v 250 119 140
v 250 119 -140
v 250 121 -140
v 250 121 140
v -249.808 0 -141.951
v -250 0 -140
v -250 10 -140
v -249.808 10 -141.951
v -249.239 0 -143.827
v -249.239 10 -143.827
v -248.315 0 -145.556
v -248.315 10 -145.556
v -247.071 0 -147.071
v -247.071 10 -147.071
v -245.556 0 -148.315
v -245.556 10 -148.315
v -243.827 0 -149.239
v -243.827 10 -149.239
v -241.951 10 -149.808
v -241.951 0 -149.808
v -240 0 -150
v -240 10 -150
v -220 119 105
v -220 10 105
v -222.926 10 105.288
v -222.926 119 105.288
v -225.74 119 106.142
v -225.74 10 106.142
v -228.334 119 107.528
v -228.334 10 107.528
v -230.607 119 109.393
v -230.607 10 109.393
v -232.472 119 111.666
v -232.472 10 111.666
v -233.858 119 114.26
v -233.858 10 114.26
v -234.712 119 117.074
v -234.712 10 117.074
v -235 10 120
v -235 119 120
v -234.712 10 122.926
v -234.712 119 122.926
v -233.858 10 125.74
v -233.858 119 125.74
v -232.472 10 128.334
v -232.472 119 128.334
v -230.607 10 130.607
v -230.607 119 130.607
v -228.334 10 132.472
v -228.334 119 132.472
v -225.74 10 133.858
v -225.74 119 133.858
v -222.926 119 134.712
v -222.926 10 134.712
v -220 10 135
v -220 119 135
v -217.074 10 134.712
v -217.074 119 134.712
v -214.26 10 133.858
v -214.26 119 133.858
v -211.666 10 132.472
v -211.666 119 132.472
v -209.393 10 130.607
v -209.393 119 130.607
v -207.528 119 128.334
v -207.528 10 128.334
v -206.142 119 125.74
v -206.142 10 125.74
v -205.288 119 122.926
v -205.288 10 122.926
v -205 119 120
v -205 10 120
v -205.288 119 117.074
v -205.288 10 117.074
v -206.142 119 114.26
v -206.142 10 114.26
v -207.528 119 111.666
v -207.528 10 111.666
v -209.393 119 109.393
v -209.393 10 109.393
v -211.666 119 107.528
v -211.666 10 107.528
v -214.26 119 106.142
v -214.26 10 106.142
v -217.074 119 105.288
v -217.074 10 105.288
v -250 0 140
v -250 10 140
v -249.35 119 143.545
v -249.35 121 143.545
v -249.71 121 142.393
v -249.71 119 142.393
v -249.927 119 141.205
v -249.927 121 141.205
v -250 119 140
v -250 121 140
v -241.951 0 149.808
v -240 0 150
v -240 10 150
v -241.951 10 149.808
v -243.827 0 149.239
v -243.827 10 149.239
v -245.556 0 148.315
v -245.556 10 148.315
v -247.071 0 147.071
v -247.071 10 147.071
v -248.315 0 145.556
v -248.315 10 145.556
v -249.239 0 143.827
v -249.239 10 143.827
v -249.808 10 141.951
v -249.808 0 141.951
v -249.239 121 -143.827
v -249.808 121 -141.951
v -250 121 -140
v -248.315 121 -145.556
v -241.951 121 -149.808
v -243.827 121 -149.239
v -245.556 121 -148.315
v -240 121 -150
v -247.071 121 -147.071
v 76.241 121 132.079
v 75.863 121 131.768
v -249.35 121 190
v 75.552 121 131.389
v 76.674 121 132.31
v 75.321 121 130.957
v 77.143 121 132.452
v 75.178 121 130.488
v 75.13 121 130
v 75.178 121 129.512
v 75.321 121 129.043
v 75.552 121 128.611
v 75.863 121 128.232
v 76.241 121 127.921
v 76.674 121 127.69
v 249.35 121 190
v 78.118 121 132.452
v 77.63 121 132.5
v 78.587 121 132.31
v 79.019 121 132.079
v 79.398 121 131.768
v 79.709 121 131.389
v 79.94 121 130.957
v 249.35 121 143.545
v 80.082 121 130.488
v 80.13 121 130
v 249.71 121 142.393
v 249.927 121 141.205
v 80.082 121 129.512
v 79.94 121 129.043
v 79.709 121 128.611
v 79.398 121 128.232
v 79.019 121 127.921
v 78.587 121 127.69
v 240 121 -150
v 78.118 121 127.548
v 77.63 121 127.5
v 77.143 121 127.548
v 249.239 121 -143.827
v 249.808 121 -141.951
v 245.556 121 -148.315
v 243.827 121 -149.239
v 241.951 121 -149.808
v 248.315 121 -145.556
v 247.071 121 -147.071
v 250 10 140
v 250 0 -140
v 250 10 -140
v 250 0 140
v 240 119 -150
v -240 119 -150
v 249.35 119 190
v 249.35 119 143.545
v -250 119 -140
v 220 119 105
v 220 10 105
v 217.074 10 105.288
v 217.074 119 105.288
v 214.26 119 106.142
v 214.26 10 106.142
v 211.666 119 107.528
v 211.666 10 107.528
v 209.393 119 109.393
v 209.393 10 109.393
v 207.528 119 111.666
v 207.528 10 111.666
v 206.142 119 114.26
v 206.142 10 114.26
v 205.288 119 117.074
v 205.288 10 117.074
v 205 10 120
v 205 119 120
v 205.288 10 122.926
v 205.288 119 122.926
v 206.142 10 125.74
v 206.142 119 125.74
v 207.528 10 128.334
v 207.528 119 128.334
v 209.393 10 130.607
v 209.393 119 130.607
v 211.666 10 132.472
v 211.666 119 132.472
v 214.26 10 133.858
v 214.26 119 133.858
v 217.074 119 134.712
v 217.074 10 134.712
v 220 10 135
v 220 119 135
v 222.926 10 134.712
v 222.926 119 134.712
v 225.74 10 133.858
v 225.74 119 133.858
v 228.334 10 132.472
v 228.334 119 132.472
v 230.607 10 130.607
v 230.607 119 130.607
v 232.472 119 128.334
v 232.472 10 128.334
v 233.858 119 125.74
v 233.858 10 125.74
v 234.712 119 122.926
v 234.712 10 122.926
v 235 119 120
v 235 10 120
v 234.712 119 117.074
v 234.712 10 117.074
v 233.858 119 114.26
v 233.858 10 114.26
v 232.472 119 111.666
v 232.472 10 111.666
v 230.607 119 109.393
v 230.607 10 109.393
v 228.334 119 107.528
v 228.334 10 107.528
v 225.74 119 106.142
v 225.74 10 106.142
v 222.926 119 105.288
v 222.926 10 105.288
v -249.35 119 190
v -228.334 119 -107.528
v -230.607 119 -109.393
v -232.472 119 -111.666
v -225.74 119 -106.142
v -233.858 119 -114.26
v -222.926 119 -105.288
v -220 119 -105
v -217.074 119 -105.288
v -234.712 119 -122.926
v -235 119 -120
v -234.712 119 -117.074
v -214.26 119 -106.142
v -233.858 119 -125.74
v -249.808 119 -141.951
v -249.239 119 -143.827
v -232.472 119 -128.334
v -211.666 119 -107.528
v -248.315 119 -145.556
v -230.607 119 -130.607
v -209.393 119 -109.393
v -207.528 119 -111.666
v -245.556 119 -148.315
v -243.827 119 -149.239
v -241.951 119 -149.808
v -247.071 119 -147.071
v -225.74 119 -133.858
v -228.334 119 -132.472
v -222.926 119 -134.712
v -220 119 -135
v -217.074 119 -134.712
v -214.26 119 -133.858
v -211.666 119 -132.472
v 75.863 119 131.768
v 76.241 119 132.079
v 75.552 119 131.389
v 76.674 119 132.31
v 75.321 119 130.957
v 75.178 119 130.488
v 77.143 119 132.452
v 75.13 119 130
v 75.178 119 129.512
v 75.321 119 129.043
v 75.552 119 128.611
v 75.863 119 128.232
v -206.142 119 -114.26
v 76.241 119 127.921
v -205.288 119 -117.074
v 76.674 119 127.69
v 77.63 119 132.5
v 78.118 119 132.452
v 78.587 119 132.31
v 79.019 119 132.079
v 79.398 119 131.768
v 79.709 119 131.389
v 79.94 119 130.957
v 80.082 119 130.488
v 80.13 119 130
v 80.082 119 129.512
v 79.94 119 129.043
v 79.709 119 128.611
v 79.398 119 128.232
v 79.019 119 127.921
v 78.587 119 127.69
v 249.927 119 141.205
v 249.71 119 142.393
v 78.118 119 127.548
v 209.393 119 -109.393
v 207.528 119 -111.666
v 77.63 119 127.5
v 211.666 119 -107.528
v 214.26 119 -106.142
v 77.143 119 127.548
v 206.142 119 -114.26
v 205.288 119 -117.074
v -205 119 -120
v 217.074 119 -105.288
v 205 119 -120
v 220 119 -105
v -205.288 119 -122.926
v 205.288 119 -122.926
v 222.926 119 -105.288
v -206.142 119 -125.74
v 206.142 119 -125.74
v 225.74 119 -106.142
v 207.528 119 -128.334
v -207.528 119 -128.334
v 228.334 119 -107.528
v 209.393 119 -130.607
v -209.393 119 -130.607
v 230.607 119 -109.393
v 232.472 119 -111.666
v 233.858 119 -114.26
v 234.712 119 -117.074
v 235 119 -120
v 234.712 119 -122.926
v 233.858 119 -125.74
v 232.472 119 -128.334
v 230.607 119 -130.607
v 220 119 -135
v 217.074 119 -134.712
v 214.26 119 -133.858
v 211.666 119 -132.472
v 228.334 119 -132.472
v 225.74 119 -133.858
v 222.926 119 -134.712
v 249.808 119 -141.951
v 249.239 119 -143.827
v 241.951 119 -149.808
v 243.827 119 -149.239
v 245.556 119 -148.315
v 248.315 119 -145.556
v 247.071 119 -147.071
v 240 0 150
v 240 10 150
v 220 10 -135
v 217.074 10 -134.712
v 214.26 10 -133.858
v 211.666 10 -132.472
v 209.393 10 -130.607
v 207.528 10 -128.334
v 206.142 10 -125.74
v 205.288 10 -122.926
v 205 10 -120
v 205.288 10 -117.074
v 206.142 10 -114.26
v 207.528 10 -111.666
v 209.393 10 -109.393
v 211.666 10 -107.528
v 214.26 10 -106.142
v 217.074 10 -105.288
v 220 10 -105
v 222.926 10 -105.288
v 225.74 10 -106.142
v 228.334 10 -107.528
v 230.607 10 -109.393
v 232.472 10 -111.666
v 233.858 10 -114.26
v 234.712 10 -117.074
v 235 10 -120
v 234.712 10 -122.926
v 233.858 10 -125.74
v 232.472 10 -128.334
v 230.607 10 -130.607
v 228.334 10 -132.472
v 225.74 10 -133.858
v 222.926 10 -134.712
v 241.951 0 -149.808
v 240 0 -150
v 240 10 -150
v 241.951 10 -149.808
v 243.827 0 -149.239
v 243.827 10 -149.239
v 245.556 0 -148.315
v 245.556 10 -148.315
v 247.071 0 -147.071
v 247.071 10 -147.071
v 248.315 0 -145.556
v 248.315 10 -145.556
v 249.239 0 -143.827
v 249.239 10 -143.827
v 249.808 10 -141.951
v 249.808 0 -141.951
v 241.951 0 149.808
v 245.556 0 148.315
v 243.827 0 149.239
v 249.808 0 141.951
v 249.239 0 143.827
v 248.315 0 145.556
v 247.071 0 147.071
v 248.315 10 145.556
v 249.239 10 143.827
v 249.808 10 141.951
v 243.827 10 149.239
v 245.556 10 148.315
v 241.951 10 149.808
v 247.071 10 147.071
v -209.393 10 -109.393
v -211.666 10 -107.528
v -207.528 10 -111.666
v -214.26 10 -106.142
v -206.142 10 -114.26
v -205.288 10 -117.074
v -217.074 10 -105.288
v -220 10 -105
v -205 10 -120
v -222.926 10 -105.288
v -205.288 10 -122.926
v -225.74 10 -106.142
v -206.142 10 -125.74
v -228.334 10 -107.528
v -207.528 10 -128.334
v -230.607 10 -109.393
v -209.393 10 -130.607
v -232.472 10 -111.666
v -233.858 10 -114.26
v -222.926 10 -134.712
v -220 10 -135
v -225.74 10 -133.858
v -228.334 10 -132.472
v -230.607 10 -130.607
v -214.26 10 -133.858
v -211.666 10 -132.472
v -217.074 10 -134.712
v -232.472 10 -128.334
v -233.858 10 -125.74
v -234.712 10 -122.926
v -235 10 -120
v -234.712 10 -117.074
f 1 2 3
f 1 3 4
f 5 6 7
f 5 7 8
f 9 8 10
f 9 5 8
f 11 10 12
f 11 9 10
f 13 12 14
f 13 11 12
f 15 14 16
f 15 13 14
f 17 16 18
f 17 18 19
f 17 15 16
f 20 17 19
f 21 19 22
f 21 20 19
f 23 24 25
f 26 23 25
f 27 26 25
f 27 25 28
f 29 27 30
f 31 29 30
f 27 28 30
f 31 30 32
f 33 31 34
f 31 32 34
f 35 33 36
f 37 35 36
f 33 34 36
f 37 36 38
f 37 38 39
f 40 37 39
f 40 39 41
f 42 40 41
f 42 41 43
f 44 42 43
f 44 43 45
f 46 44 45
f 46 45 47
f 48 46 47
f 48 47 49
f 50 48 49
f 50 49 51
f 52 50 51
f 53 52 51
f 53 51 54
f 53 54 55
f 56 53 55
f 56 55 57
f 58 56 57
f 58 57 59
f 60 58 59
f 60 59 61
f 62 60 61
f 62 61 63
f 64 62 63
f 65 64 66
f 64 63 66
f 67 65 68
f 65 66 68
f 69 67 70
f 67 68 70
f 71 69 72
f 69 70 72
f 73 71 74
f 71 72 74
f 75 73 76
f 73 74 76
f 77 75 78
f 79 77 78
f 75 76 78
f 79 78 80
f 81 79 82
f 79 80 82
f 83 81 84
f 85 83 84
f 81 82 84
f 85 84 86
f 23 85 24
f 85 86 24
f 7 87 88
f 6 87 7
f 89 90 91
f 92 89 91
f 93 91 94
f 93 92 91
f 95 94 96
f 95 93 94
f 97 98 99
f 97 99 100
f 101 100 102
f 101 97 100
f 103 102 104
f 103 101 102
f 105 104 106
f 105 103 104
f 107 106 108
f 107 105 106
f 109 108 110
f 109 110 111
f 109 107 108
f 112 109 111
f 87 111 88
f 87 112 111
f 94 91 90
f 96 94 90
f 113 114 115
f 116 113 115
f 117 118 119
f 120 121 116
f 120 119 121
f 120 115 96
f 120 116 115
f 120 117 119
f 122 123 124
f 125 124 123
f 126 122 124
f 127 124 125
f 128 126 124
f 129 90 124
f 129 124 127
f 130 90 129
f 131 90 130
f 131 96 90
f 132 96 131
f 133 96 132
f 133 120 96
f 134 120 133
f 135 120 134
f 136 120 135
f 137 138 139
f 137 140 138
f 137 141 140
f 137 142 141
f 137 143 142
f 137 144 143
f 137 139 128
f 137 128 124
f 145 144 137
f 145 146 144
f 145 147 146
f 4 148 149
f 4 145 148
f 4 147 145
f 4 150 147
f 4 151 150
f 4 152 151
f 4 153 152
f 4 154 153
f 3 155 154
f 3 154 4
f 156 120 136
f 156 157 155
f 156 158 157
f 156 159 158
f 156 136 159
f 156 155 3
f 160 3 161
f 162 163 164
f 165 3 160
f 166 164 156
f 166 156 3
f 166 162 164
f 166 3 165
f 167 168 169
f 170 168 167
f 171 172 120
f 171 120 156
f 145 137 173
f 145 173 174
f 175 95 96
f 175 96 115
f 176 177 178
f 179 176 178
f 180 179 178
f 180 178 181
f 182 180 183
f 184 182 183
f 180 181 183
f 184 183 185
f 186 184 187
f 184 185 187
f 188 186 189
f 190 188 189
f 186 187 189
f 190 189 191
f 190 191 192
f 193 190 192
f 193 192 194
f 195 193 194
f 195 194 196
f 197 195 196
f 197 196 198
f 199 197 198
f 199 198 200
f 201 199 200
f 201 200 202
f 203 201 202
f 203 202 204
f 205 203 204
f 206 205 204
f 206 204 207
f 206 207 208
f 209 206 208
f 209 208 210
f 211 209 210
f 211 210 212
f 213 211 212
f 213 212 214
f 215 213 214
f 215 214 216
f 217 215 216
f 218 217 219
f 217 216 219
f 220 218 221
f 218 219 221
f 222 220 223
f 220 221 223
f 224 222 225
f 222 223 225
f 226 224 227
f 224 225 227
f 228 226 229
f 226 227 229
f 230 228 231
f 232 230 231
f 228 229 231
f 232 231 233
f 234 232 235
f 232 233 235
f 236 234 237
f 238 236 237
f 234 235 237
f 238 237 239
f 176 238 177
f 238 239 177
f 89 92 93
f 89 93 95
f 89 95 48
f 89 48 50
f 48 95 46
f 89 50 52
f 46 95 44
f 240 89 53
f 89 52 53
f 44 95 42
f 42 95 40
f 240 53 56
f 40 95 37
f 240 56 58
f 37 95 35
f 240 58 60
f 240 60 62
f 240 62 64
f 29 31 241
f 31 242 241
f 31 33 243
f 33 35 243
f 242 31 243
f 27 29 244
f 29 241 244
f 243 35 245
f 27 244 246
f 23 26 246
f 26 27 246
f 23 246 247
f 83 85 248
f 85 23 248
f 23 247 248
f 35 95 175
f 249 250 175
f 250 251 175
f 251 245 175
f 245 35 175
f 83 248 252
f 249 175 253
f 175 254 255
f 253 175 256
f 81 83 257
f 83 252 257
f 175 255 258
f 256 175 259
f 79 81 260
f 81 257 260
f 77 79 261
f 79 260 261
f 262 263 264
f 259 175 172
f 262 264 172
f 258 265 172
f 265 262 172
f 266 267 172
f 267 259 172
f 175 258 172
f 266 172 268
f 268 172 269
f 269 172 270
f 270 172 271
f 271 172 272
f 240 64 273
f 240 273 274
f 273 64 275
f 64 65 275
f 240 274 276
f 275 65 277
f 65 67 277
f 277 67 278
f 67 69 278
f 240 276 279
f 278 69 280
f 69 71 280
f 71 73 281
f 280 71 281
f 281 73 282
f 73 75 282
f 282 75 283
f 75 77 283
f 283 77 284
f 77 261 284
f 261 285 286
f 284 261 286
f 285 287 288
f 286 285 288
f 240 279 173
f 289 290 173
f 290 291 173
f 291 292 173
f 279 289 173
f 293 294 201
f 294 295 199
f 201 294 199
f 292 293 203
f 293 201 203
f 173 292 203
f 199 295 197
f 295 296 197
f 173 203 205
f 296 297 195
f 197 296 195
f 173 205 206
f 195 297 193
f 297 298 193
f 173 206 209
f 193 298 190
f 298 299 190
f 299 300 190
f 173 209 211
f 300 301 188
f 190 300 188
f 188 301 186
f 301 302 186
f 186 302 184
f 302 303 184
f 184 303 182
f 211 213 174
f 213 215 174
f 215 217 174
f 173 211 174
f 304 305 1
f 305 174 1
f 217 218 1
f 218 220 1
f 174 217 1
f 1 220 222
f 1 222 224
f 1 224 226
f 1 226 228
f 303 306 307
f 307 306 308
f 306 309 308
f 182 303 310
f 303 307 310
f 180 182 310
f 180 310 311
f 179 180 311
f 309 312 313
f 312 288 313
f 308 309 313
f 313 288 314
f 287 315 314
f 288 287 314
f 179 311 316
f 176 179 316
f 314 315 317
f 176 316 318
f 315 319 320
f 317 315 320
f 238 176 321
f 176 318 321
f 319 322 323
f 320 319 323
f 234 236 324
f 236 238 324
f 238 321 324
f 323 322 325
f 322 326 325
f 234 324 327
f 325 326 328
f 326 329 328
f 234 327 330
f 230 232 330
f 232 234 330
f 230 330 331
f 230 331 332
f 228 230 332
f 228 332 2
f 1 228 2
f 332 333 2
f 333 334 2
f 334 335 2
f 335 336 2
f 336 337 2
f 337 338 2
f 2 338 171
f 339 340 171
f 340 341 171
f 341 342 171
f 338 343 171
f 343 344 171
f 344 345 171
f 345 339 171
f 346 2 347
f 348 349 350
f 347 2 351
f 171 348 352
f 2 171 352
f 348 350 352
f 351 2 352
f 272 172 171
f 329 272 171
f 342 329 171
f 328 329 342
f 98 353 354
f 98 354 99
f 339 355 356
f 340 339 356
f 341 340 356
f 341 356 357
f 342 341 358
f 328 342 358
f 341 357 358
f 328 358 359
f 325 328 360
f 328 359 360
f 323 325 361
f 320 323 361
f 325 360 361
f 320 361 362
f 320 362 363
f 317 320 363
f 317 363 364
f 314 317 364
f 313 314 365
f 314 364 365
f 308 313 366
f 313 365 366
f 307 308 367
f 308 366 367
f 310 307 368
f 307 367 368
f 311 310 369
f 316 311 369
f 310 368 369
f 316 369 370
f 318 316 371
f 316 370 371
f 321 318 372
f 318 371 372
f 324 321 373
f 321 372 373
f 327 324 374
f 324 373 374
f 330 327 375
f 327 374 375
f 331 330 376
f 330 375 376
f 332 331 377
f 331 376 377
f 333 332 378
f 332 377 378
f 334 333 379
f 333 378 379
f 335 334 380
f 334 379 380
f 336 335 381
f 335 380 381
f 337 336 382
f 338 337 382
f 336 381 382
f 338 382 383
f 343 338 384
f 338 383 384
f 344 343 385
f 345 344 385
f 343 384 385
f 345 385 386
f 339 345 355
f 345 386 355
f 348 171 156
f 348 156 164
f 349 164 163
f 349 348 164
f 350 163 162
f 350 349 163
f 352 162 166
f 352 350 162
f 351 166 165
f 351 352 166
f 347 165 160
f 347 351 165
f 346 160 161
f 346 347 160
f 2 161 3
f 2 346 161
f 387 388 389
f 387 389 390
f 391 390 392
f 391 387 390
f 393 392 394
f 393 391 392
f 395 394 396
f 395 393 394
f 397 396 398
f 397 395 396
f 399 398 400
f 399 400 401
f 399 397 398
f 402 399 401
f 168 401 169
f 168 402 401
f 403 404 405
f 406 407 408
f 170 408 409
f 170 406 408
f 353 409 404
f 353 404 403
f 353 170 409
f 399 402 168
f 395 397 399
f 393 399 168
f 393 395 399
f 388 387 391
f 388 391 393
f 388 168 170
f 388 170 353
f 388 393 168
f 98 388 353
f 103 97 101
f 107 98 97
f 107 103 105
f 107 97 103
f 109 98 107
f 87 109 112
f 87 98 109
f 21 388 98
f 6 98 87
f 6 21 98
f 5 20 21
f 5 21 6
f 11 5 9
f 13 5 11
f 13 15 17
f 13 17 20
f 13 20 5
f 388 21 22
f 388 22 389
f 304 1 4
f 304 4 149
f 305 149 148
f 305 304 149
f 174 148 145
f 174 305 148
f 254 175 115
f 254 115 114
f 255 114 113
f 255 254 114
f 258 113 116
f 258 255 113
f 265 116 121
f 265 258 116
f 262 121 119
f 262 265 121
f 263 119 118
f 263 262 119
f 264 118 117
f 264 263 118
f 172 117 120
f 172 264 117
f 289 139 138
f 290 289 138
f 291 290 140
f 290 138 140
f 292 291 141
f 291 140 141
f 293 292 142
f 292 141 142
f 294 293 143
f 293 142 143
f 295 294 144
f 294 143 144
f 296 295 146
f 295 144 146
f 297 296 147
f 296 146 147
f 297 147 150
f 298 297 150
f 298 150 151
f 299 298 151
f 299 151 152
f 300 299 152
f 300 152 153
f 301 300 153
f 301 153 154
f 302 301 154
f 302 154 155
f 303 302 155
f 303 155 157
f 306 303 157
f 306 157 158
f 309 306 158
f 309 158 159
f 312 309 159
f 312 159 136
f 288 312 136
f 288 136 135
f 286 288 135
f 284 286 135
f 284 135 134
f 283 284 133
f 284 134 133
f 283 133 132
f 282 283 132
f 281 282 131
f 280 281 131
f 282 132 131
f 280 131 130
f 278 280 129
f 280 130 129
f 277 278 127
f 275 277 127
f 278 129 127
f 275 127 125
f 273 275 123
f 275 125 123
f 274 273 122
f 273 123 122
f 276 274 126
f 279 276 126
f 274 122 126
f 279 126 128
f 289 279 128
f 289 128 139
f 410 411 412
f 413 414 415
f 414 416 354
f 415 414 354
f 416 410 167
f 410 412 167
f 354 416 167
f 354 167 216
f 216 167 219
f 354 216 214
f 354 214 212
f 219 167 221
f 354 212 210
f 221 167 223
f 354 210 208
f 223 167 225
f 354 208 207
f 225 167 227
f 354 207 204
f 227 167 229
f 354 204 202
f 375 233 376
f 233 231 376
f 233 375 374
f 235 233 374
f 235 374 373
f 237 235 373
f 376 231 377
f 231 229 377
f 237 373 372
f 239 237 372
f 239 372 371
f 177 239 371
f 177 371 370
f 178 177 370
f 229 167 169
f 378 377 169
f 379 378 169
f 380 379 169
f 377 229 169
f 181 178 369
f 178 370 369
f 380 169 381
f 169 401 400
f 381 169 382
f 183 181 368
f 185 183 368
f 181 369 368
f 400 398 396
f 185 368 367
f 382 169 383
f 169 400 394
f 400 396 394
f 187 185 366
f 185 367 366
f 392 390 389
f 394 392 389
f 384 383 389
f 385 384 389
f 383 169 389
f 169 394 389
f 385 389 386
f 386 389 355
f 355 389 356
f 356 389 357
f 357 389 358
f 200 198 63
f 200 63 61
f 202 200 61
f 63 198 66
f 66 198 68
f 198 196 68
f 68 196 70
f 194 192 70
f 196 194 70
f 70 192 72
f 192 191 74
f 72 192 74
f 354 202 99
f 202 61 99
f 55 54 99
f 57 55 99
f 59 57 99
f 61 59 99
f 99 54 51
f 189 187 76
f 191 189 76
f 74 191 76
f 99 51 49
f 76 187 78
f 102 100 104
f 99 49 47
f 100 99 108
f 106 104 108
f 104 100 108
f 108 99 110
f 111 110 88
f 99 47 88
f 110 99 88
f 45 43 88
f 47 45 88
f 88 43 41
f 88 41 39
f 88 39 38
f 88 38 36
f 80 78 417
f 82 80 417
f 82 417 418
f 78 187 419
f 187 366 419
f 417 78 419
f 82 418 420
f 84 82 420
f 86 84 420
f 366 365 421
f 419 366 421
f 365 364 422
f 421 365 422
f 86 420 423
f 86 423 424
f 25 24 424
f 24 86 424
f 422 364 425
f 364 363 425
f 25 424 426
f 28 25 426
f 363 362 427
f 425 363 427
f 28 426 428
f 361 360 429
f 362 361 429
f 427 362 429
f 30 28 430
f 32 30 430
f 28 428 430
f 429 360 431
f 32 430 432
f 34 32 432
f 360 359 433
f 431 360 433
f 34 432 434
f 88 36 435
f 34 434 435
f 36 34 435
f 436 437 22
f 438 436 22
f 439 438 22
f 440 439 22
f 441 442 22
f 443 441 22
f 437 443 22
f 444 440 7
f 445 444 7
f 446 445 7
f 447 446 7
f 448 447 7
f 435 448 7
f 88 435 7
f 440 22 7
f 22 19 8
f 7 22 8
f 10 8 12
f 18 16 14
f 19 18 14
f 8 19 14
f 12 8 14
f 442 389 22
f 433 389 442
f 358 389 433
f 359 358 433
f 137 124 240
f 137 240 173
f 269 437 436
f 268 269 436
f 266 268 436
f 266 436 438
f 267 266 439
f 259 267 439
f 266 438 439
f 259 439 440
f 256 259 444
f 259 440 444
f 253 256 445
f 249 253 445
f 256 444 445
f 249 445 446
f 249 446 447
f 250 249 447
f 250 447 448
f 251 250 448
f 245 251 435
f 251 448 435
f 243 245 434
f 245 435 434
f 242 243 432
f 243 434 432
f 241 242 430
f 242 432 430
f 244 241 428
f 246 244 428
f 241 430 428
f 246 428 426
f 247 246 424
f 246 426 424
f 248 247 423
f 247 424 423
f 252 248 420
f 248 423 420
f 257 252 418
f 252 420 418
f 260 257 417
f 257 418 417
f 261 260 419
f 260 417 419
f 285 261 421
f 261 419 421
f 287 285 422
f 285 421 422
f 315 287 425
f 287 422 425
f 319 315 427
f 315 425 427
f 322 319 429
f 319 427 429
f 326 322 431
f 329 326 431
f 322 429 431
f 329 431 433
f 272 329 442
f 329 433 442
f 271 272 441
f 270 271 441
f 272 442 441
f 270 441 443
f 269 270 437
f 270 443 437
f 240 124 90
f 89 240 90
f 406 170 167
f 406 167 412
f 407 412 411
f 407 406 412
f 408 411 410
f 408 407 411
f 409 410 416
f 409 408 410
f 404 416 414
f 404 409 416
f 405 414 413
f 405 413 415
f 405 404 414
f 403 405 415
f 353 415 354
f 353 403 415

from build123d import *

# Parameters (mm, degrees)
BOSS_EXTRUDE1_DEPTH = 10
SKETCH2_R           = 15
BOSS_EXTRUDE2_DEPTH = 109
BOSS_EXTRUDE3_DEPTH = 2
SKETCH4_W           = 498.700760334
SKETCH4_H           = 80
BOSS_EXTRUDE4_DEPTH = 2
SKETCH5_R           = 2.5
CUT_EXTRUDE1_DEPTH  = 20


with BuildPart() as part:
    # Sketch1 → Boss-Extrude1 (new body)
    with BuildSketch(Plane(origin=(0, 0, 0), x_dir=(1, 0, 0), z_dir=(0, 1, 0))):
        with BuildLine():
            Line((-240, 150), (240, 150))
            ThreePointArc((240, 150), (247.071067812, 147.071067812), (250, 140))
            Line((250, 140), (250, -140))
            ThreePointArc((250, -140), (247.071067812, -147.071067812), (240, -150))
            Line((240, -150), (-240, -150))
            ThreePointArc((-240, -150), (-247.071067812, -147.071067812), (-250, -140))
            Line((-250, -140), (-250, 140))
            ThreePointArc((-250, 140), (-247.071067812, 147.071067812), (-240, 150))
        make_face()
    extrude(amount=BOSS_EXTRUDE1_DEPTH)

    # Sketch2 → Boss-Extrude2 (add)
    with BuildSketch(Plane(origin=(0, 10, 0), x_dir=(1, 0, 0), z_dir=(0, 1, 0))):
        with Locations(Location((-220, 120, 0), (0, 0, 90))):
            Circle(SKETCH2_R)
        with Locations(Location((220, 120, 0), (0, 0, 90))):
            Circle(SKETCH2_R)
        with Locations(Location((220, -120, 0), (0, 0, 90))):
            Circle(SKETCH2_R)
        with Locations(Location((-220, -120, 0), (0, 0, 90))):
            Circle(SKETCH2_R)
    extrude(amount=BOSS_EXTRUDE2_DEPTH)

    # Sketch3 → Boss-Extrude3 (add)
    with BuildSketch(Plane(origin=(0, 119, 0), x_dir=(1, 0, 0), z_dir=(0, 1, 0))):
        with BuildLine():
            Line((-240, 150), (240, 150))
            ThreePointArc((240, 150), (247.071067812, 147.071067812), (250, 140))
            Line((250, 140), (250, -140))
            ThreePointArc((250, -140), (247.071067812, -147.071067812), (240, -150))
            Line((240, -150), (-240, -150))
            ThreePointArc((-240, -150), (-247.071067812, -147.071067812), (-250, -140))
            Line((-250, -140), (-250, 140))
            ThreePointArc((-250, 140), (-247.071067812, 147.071067812), (-240, 150))
        make_face()
    extrude(amount=BOSS_EXTRUDE3_DEPTH)

    # Sketch4 → Boss-Extrude4 (add)
    with BuildSketch(Plane(origin=(0, 121, 0), x_dir=(1, 0, 0), z_dir=(0, 1, 0))):
        with Locations((0, -150)):
            Rectangle(SKETCH4_W, SKETCH4_H)
    extrude(amount=-BOSS_EXTRUDE4_DEPTH)

    # Sketch5 → Cut-Extrude1 (cut)
    with BuildSketch(Plane(origin=(0, 121, 0), x_dir=(1, 0, 0), z_dir=(0, 1, 0))):
        with Locations(Location((77.630380167, -130, 0), (0, 0, 270))):
            Circle(SKETCH5_R)
    extrude(amount=-CUT_EXTRUDE1_DEPTH, mode=Mode.SUBTRACT)


solid = part.part
